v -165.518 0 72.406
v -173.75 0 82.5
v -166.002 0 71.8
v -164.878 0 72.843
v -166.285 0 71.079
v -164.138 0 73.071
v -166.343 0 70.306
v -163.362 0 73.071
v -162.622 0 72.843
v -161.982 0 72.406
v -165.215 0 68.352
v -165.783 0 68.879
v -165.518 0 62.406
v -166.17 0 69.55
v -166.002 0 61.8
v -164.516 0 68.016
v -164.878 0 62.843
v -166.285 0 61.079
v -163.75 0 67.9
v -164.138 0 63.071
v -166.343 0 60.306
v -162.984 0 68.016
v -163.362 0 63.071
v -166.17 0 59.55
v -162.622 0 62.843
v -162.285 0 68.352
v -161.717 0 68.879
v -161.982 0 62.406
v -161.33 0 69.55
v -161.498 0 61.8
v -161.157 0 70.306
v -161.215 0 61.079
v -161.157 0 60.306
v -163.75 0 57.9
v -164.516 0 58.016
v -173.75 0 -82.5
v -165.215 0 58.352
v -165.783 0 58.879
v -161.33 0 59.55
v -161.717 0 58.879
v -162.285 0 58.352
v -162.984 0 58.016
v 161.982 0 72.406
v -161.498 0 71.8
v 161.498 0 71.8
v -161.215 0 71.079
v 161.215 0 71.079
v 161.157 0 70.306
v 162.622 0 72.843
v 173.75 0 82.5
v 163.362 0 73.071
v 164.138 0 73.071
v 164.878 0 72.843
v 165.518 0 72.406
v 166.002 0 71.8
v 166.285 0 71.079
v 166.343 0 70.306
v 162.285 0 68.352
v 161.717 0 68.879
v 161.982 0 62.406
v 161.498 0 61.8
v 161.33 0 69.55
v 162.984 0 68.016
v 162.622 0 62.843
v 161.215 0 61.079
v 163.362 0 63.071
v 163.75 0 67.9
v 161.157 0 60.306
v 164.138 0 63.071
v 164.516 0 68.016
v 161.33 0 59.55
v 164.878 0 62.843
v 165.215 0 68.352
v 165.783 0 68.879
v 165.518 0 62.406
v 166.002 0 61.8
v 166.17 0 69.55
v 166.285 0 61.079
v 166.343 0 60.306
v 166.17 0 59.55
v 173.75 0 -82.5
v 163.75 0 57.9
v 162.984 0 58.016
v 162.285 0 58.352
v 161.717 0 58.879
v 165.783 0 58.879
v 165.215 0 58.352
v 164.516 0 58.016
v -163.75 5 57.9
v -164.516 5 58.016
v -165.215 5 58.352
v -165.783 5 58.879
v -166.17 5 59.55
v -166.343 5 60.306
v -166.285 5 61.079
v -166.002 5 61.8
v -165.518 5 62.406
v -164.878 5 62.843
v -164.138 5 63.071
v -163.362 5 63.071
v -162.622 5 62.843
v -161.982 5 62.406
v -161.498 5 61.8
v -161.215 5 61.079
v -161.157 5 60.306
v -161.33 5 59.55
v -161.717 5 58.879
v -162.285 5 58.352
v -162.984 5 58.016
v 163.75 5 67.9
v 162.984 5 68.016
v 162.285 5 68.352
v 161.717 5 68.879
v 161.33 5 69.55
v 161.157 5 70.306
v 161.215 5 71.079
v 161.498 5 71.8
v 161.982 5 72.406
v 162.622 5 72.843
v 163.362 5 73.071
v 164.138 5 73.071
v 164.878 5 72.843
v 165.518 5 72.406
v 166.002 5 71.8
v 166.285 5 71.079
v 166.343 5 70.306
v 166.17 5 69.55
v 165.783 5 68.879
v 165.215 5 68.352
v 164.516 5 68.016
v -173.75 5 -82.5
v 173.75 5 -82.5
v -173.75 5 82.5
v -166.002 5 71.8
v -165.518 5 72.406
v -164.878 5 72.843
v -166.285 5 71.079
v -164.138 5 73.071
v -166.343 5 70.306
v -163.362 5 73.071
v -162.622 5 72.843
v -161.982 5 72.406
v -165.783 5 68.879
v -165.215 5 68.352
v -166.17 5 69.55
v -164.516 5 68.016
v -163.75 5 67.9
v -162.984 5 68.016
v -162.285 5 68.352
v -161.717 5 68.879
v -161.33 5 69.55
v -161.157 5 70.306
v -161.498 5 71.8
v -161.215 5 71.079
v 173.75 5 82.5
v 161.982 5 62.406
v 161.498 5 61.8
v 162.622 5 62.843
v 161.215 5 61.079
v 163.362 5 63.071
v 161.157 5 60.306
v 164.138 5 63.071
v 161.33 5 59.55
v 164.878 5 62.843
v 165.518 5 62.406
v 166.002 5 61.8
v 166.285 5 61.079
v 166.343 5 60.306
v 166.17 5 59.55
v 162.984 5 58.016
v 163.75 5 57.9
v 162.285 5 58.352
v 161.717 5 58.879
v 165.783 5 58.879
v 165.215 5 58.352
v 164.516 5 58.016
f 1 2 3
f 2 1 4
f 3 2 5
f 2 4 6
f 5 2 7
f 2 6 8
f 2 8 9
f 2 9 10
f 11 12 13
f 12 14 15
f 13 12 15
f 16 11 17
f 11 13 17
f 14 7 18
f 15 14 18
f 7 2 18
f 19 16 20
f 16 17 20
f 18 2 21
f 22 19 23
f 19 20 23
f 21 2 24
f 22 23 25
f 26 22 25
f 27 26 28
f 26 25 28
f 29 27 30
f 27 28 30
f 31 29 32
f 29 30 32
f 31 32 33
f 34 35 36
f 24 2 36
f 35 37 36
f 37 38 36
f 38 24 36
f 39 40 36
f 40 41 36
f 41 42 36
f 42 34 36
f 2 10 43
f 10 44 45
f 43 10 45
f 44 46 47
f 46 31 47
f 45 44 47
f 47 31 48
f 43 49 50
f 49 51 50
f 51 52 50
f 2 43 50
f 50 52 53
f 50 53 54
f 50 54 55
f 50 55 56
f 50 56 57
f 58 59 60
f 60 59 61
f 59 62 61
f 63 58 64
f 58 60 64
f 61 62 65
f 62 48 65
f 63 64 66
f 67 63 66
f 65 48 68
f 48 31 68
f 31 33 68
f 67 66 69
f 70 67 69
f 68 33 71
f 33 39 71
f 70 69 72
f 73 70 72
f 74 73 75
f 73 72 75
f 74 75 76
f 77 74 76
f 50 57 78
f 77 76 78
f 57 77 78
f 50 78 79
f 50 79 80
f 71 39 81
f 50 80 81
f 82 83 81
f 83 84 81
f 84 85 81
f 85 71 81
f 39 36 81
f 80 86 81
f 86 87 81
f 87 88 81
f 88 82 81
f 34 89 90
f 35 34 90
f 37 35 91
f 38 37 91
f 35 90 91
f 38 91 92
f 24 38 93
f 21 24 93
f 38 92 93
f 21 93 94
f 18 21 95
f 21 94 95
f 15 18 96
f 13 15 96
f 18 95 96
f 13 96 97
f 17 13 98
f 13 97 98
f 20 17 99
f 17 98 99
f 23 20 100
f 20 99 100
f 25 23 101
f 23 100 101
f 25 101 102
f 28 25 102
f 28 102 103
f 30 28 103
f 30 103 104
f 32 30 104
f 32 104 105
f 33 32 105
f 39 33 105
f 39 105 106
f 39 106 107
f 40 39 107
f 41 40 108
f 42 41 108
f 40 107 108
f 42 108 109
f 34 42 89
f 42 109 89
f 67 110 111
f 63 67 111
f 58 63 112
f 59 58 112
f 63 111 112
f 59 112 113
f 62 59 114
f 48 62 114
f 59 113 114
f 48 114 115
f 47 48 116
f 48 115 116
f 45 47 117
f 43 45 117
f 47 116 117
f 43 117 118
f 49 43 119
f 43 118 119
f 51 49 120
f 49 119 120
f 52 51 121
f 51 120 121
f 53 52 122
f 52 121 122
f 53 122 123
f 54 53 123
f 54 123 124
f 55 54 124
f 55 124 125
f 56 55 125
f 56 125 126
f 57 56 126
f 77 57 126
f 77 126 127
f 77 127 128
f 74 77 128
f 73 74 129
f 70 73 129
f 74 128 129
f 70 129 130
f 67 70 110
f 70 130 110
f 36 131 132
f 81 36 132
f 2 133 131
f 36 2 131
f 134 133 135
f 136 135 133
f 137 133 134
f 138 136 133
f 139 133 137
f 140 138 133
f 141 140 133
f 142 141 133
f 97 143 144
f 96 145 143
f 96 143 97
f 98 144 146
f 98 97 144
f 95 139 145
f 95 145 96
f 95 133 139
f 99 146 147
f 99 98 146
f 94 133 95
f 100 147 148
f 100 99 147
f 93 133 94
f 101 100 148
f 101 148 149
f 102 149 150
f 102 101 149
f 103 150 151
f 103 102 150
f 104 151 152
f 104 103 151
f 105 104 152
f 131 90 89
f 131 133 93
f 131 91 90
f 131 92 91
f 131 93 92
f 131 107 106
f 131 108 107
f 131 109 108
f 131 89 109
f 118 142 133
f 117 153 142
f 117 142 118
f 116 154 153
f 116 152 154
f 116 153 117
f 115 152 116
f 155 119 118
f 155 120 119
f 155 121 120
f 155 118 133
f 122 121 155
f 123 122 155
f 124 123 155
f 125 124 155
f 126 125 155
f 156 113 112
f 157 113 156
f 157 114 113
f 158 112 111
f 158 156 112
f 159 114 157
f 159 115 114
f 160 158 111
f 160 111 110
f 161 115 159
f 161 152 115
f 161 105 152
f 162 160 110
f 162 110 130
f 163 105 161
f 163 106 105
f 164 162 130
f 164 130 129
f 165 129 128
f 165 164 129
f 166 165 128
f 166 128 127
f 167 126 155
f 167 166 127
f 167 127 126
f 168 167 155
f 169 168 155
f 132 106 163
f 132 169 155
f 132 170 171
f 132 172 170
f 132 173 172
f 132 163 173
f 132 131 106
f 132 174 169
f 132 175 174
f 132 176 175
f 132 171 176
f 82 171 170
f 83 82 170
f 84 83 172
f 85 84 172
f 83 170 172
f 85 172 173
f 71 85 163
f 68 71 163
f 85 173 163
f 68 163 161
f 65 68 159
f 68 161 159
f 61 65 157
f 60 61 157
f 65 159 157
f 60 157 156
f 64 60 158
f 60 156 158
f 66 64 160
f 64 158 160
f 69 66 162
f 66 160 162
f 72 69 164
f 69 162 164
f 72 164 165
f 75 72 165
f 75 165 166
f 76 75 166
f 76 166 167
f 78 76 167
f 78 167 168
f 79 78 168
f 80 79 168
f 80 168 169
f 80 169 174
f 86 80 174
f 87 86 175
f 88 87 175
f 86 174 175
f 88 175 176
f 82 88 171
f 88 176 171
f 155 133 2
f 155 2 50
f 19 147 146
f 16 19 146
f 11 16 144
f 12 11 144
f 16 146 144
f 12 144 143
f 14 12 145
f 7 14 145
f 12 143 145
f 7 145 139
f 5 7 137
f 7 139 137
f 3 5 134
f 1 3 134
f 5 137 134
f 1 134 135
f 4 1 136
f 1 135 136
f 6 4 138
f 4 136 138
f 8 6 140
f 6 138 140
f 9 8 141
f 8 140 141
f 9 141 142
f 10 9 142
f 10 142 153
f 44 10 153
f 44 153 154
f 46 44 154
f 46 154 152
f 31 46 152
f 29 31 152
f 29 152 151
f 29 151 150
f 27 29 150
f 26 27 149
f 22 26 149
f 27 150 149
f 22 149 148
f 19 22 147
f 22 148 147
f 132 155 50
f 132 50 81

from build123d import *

# Parameters (mm, degrees)
SKETCH_1_W      = 347.5
SKETCH_1_H      = 165
SKETCH_1_R      = 2.6
EXTRUDE_1_DEPTH = 5


with BuildPart() as part:
    # 草图1 → 凸台-拉伸1 (new body)
    with BuildSketch(Plane(origin=(0, 5, 0), x_dir=(1, 0, 0), z_dir=(0, 1, 0))):
        Rectangle(SKETCH_1_W, SKETCH_1_H)
        with Locations(Location((-163.75, -70.5, 0), (0, 0, 90))):
            Circle(SKETCH_1_R, mode=Mode.SUBTRACT)
        with Locations(Location((-163.75, -60.5, 0), (0, 0, 90))):
            Circle(SKETCH_1_R, mode=Mode.SUBTRACT)
        with Locations(Location((163.75, -60.5, 0), (0, 0, 90))):
            Circle(SKETCH_1_R, mode=Mode.SUBTRACT)
        with Locations(Location((163.75, -70.5, 0), (0, 0, 90))):
            Circle(SKETCH_1_R, mode=Mode.SUBTRACT)
    extrude(amount=-EXTRUDE_1_DEPTH)


solid = part.part
